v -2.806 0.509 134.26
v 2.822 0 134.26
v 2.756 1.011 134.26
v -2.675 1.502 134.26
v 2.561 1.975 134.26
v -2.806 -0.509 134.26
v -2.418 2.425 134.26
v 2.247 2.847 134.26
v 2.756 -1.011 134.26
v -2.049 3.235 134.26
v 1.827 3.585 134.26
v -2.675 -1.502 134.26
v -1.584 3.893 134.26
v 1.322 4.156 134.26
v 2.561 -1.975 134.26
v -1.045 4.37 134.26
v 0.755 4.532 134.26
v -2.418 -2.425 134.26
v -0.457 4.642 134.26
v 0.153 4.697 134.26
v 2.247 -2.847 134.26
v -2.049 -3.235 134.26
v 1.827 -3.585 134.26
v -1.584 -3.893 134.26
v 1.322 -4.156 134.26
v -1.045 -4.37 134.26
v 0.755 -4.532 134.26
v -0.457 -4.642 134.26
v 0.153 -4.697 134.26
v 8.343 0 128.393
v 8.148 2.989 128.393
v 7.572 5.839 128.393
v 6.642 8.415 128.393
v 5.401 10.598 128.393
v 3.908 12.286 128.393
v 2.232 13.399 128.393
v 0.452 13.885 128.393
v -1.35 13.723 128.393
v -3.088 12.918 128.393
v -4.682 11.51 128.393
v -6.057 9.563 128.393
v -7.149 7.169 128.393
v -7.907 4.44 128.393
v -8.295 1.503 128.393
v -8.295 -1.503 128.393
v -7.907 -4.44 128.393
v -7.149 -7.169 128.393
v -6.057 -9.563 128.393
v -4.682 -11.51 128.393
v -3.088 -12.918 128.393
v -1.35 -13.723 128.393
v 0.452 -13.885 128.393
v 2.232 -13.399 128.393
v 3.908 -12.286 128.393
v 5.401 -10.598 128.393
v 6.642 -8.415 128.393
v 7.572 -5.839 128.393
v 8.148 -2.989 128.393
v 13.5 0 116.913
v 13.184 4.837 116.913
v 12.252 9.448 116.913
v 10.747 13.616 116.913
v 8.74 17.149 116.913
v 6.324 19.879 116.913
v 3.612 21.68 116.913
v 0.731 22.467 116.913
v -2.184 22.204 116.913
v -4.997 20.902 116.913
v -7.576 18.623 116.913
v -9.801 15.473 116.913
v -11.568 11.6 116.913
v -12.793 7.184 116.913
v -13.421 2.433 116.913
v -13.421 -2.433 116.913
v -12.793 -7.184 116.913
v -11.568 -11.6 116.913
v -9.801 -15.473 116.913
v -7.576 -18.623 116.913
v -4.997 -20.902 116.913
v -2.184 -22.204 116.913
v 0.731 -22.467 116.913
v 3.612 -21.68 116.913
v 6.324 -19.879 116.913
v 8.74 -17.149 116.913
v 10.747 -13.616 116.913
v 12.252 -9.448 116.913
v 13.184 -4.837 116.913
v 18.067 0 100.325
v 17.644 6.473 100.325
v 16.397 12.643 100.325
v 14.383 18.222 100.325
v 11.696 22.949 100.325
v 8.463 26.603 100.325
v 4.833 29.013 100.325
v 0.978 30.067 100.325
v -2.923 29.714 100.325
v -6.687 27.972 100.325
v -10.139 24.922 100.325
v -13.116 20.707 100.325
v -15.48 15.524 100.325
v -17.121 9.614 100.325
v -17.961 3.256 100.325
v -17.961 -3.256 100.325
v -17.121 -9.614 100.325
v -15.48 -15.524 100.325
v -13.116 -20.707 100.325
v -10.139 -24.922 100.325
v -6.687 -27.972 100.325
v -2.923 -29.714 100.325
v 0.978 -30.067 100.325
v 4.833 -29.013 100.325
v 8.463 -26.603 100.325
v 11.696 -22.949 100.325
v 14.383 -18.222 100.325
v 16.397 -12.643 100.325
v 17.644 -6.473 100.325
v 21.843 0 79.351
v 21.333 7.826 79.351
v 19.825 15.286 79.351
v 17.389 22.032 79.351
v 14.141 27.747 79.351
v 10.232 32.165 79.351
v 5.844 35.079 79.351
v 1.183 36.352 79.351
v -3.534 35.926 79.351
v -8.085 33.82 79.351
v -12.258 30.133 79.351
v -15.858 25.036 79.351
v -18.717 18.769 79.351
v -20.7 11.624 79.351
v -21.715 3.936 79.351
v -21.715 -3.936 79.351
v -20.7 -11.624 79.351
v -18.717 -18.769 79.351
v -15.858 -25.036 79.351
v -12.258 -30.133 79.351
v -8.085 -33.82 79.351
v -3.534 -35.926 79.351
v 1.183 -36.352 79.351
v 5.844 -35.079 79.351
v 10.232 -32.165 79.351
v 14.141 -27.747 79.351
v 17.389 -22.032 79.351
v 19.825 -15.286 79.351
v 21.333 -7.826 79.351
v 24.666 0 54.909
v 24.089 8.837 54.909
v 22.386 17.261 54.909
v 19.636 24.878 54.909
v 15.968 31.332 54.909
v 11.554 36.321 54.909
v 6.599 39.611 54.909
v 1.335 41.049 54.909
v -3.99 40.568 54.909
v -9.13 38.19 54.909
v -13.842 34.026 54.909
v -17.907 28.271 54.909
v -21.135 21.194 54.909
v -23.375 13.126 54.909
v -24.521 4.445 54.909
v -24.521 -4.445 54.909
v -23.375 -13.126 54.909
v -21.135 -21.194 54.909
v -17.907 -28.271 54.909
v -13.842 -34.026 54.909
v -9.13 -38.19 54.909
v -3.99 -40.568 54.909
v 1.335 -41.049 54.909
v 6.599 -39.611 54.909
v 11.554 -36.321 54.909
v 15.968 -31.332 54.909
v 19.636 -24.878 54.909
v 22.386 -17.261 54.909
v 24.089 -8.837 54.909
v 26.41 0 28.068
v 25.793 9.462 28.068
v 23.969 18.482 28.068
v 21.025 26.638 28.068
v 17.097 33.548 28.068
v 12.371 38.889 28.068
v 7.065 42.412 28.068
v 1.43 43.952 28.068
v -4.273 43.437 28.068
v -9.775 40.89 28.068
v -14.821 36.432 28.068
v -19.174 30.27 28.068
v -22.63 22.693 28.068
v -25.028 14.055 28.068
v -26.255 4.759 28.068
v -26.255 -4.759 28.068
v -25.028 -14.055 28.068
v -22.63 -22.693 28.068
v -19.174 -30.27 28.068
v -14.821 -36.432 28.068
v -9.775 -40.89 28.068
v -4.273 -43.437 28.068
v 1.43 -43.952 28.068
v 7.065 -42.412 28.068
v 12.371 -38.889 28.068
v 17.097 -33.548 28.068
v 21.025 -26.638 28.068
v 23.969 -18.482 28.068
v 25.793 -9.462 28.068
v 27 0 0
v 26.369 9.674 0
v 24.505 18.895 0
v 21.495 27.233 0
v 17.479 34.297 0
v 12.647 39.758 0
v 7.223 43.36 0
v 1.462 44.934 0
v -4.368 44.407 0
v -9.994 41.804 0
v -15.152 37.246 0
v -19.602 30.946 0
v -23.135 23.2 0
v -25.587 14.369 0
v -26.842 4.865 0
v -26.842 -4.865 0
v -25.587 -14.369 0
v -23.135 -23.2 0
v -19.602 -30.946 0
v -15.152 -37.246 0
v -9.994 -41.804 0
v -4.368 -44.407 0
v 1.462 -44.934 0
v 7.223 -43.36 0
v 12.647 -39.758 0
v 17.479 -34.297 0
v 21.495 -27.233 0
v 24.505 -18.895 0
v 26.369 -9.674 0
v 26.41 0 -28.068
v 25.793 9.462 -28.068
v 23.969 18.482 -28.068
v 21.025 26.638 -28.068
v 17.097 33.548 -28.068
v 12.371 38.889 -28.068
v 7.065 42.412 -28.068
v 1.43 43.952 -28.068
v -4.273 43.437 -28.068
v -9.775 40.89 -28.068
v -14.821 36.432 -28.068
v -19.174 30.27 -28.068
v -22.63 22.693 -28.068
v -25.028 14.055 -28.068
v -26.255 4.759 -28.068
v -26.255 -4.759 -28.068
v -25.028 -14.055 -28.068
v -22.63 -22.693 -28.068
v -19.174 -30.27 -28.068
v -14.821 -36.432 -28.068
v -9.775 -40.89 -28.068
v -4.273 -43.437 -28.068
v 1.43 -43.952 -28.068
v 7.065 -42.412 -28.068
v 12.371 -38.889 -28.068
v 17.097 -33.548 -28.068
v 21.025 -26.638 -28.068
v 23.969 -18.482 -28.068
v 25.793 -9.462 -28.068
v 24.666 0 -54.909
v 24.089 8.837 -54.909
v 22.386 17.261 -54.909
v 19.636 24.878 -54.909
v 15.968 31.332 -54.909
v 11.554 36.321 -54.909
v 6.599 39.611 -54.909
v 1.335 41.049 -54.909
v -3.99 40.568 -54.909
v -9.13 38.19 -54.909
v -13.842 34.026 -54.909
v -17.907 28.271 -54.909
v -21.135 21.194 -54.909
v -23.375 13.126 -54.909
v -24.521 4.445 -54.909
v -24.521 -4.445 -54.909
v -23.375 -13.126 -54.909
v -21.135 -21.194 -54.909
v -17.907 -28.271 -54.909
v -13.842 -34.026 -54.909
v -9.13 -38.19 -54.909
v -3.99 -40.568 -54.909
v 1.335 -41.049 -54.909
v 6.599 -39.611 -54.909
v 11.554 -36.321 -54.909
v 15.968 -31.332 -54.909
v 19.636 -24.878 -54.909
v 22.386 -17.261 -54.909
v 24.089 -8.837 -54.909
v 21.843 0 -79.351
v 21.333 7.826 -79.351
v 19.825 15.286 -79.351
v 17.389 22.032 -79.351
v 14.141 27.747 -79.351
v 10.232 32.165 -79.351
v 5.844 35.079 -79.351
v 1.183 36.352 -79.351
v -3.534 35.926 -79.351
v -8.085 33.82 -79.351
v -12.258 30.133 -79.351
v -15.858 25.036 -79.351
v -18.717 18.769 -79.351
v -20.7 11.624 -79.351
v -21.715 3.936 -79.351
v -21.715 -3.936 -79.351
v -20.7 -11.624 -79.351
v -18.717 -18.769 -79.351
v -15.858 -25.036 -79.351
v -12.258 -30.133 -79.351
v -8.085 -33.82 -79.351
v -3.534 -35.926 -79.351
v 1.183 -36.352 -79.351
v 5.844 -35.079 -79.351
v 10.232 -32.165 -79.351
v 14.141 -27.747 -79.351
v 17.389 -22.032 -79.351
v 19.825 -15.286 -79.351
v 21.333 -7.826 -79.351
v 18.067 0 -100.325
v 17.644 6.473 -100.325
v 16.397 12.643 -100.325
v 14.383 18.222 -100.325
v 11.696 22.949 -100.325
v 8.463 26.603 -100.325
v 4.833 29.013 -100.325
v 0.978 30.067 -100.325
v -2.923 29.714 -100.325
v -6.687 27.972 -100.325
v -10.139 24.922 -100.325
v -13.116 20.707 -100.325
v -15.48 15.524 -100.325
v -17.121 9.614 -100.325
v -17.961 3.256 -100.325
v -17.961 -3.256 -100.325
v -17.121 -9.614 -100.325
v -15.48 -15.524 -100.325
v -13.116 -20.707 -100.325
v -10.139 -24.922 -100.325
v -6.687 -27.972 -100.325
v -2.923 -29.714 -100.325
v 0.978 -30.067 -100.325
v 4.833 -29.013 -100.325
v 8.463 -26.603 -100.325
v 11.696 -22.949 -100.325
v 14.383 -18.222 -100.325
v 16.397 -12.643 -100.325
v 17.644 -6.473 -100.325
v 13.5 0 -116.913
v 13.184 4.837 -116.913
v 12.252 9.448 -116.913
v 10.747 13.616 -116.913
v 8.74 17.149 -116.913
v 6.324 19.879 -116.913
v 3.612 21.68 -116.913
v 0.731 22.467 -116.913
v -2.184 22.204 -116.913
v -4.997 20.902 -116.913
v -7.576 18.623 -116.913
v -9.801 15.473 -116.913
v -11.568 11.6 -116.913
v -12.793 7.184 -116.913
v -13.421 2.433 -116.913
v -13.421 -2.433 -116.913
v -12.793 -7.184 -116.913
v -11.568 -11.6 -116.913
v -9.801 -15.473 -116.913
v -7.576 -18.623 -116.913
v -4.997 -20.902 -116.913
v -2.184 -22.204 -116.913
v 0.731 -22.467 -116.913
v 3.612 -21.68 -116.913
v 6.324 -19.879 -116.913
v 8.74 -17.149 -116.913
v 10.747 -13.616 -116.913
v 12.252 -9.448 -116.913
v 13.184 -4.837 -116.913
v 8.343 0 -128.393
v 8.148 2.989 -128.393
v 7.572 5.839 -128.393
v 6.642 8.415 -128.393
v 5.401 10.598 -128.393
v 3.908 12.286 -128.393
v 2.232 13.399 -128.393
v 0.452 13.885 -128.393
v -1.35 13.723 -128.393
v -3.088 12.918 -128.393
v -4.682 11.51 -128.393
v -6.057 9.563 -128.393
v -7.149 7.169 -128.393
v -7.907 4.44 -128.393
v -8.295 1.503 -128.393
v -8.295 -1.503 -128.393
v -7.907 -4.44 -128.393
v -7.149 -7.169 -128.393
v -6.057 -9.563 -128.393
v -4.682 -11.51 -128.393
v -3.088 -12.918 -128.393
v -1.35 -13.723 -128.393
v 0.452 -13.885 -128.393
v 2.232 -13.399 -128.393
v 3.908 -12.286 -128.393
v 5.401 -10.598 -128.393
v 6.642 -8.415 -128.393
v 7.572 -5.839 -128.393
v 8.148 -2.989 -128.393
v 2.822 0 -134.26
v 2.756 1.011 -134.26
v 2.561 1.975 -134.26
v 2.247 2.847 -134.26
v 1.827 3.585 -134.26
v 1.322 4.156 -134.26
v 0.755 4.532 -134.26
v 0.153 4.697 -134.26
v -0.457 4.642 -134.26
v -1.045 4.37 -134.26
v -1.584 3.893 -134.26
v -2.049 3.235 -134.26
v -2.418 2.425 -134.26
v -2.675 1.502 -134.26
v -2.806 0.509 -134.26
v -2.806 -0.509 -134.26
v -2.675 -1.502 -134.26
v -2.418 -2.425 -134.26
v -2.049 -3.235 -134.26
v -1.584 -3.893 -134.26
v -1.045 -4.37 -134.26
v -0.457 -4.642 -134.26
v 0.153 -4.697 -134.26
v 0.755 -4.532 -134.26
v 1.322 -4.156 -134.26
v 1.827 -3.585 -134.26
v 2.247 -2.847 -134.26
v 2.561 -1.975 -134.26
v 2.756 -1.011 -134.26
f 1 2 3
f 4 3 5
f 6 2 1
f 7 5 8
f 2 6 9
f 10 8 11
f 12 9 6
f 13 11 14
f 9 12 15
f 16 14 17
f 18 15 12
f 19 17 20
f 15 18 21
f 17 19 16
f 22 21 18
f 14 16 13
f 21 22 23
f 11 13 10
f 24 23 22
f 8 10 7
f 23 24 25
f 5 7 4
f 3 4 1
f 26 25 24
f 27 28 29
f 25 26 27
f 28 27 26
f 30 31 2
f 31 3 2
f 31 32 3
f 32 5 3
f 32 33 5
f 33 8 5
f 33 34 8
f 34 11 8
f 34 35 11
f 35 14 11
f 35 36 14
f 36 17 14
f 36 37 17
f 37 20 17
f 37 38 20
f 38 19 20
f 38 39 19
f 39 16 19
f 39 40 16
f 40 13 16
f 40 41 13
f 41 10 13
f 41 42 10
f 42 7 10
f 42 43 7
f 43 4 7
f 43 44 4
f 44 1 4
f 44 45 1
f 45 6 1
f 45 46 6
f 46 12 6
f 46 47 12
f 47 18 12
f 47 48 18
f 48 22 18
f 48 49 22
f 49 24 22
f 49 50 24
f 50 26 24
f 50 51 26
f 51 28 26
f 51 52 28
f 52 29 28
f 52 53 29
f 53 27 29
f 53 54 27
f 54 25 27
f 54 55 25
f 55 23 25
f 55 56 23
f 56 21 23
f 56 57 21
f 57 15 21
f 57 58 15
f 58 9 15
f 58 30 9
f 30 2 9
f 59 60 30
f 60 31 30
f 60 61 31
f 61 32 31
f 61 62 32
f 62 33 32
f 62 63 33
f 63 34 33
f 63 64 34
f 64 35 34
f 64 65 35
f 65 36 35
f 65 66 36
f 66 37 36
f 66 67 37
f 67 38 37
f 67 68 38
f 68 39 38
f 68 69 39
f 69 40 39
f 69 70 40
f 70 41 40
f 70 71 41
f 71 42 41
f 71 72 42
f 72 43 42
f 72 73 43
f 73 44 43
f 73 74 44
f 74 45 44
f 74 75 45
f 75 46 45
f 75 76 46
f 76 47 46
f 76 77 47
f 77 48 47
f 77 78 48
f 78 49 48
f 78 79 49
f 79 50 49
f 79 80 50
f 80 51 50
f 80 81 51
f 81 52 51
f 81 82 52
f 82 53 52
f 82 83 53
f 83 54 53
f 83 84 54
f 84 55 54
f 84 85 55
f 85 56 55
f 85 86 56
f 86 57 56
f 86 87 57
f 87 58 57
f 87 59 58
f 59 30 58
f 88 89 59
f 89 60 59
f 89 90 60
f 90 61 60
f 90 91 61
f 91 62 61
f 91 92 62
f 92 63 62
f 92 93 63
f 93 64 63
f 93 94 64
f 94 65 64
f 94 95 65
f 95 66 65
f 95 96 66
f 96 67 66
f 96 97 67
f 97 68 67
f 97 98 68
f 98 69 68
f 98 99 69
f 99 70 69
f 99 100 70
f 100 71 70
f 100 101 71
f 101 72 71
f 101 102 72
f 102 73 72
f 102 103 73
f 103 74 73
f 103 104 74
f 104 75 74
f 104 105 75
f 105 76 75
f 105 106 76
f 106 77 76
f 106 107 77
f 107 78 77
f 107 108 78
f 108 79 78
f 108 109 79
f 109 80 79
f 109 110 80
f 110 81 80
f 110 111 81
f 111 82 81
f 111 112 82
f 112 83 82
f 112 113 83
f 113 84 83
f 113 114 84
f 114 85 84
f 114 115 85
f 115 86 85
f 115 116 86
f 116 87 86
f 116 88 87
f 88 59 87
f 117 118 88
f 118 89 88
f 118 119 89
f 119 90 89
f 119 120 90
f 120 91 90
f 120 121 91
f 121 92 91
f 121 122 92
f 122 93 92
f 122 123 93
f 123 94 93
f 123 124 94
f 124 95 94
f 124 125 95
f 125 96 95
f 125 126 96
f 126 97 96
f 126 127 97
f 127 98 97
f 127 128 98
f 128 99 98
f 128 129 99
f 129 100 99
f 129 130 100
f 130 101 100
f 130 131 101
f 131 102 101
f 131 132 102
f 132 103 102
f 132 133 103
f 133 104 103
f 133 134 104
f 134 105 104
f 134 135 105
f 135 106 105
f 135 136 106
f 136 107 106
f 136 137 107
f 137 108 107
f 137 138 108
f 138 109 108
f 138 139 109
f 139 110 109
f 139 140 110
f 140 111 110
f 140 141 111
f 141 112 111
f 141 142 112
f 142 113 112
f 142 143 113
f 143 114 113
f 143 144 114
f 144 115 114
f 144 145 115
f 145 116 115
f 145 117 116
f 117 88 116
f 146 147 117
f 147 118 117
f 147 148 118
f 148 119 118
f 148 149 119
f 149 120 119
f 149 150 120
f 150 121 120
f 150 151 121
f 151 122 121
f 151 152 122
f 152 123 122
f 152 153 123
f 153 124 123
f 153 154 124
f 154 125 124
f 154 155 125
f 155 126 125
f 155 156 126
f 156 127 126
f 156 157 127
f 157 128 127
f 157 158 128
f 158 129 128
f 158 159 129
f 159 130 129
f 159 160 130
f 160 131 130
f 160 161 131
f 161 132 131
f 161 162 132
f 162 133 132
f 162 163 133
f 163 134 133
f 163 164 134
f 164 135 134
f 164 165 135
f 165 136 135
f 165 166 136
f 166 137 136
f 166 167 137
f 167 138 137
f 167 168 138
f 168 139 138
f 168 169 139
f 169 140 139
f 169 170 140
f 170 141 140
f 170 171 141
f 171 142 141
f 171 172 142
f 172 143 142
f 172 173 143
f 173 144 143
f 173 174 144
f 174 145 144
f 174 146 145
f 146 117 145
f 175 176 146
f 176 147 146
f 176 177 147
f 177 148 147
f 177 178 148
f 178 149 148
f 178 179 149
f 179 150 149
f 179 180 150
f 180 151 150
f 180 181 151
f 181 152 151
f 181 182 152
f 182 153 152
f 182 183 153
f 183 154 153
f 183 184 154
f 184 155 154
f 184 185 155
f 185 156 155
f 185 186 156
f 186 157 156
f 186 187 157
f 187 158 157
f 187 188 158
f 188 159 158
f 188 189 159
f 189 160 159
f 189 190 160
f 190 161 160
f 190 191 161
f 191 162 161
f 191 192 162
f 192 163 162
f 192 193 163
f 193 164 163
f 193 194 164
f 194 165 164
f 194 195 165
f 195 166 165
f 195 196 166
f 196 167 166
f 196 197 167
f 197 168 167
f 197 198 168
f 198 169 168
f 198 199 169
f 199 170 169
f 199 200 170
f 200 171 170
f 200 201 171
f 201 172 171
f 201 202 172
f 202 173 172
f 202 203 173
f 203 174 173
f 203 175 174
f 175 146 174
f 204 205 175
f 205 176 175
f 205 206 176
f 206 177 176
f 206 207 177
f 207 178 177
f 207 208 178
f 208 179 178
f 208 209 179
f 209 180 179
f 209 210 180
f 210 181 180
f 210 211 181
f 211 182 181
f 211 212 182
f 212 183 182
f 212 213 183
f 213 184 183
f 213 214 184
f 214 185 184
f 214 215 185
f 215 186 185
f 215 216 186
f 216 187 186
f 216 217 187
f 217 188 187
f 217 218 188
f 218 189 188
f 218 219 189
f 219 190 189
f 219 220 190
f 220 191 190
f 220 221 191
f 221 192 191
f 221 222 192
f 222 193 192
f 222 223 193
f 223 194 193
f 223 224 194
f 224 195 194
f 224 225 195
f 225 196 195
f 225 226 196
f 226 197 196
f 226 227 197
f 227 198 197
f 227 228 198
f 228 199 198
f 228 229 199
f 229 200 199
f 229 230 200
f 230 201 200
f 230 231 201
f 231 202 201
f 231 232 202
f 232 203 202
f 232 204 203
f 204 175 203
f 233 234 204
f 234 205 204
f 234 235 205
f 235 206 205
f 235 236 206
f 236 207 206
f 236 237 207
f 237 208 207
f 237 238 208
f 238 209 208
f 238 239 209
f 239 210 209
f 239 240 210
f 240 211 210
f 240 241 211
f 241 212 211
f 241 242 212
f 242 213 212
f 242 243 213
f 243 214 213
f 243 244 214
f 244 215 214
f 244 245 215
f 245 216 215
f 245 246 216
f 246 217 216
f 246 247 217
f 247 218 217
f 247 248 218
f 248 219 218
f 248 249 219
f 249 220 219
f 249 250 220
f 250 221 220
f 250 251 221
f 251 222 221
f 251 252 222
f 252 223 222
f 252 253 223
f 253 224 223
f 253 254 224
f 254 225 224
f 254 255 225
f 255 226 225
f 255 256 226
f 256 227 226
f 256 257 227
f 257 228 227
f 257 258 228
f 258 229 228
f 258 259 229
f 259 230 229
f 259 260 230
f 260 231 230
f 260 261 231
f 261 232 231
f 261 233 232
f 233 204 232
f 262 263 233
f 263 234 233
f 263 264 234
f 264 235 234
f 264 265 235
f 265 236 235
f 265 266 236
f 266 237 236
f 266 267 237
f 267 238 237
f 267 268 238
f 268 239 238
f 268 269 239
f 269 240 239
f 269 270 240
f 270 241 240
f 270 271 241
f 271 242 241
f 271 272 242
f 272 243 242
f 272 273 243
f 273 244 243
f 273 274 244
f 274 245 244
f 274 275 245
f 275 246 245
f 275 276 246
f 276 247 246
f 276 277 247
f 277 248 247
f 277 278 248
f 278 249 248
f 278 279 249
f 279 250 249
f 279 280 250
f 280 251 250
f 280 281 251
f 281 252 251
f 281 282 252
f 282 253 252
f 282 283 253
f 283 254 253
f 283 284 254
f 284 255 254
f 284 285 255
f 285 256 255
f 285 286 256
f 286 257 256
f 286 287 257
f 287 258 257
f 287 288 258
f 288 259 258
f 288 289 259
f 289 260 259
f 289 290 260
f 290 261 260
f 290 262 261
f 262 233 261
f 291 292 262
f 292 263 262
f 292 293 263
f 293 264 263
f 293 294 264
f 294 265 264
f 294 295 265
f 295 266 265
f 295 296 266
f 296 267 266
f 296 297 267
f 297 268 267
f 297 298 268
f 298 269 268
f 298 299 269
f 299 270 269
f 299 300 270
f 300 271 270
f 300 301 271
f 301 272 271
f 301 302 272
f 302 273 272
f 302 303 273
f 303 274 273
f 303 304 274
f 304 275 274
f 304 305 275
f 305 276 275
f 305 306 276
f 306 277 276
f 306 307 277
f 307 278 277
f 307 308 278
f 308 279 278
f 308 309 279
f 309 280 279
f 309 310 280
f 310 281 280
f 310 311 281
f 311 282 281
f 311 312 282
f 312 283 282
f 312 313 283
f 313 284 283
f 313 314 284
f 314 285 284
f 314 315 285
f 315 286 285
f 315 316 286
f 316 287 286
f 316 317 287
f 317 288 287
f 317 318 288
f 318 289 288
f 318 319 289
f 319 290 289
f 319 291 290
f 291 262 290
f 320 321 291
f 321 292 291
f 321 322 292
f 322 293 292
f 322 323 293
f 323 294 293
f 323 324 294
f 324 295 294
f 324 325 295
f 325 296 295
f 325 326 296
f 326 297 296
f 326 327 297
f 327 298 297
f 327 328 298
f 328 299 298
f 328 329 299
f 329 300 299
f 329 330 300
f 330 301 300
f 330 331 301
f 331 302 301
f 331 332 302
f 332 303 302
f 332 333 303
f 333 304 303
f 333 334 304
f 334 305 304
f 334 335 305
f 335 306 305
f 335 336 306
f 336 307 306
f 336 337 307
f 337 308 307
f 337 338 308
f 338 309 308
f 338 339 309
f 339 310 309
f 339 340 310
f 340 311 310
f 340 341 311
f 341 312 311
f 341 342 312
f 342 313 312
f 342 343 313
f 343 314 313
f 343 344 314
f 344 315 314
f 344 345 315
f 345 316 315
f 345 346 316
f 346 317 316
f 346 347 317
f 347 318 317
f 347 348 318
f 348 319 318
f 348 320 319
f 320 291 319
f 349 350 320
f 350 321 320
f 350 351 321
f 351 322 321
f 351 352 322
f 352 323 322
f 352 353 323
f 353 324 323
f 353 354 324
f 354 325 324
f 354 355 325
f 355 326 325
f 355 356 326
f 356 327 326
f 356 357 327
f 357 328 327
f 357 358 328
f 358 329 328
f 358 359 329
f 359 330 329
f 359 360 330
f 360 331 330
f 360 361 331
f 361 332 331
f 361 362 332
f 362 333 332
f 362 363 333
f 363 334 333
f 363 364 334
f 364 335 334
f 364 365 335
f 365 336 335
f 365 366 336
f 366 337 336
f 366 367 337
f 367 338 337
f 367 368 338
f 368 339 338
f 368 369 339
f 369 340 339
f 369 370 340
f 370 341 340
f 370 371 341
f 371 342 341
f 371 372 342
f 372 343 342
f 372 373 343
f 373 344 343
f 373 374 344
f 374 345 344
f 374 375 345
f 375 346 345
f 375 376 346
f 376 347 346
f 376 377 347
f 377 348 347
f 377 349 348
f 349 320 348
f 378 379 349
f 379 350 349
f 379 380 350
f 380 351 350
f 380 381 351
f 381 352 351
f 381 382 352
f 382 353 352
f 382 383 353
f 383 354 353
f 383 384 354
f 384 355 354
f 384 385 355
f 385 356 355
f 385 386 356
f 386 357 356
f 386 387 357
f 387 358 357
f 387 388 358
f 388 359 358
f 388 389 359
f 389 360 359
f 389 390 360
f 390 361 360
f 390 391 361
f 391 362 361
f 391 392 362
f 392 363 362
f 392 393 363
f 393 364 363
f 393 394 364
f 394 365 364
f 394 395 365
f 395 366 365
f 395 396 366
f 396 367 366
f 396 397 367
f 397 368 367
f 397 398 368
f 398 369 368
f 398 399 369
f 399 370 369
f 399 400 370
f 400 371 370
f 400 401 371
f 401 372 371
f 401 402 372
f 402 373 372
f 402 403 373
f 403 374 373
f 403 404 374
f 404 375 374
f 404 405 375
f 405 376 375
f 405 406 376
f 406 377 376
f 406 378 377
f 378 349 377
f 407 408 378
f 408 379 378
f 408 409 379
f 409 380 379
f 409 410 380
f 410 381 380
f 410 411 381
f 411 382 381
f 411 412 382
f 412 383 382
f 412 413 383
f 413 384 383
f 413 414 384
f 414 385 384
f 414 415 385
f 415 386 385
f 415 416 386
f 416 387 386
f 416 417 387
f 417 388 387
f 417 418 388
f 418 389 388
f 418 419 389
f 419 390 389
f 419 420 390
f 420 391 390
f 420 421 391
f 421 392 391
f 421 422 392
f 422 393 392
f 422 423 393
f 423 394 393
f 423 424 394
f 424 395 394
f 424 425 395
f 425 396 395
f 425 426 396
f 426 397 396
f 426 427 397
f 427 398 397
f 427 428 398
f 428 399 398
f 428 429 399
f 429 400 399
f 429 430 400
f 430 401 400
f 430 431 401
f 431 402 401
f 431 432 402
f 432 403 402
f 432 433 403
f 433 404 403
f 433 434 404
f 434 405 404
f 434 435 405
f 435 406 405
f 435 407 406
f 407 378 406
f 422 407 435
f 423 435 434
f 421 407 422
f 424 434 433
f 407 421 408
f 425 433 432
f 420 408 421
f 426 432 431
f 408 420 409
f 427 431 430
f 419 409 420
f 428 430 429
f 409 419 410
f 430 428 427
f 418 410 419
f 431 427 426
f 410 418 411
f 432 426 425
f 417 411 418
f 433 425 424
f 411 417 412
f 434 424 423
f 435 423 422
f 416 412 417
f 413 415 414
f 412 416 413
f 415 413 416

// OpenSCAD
// Generated by SolidPython 1.0.1 on 2020-07-29 00:46:45


scale(v = [3, 5, 15]) {
	sphere(r = 9);
}
/***********************************************
*********      SolidPython code:      **********
************************************************
 
# import packages: SolidPython
from solid import *
from solid.utils import *
from itertools import chain, combinations, permutations


class Resize:

    def __init__(self, scad_file):
        self.scad_file = scad_file
        #self.scad_file = import_scad(scad_file)
        # cone/cylinder param:
        self.r1 = 0
        self.r2 = 0
        self.h = 0
        # rectangular prism param:
        self.w = 0
        self.l = 0
        # ellipse param:
        self.r = 0

    # import OpenScad code (file name corresponds to shape)


    # classify shape + parameters
    def assign(self, param1, param2, param3):
        if self.scad_file == 'cone.scad':
            self.r1 = param1
            self.r2 = param2
            self.h = param3
        elif self.scad_file == 'cylinder.scad':
            self.r1 = param1
            self.r2 = param2
            self.h = param3
        elif self.scad_file == 'rectangularPrism.scad':
            self.h = param1
            self.l = param2
            self.w = param3
        else:
            self.r = param1
            self.h = param2

    # resize parameters
    def iterate(self):
        x = range(3, 20, 2)
        i = 1
        if self.scad_file == 'cone.scad':
            tempList = list(permutations(x, 2))
            for temp in tempList:
                param1 = temp[0]
                param2 = temp[1]
                filepath = 'produced_scad_files/' + 'cone' + str(param1) + '_' + str(param2) + '_' + '.scad'
                scad_render_to_file(cylinder(h=param1, r1=param2, r2=0), filepath)

        elif self.scad_file == 'cylinder.scad':
            tempList = list(permutations(x, 3))
            for temp in tempList:
                param1 = temp[0]
                param2 = temp[1]
                filepath = 'produced_scad_files/' + 'cylinder' + str(param1) + '_' + str(param2) + '_' + '.scad'
                scad_render_to_file(cylinder(h=param1, r1=param2, r2=param2), filepath)

        elif self.scad_file == 'rectangularPrism.scad':
            tempList = list(permutations(x, 3))
            for temp in tempList:
                param1 = temp[0]
                param2 = temp[1]
                param3 = temp[2]
                filepath = 'produced_scad_files/' + 'rectangularPrism' + str(param1) + '_' + str(param2) + '_' + str(
                    param3) + '.scad'
                scad_render_to_file(cube(size=(param1, param2, param3)), filepath)

        elif self.scad_file == 'ellipse.scad':
            tempList = list(permutations(x, 4))
            for temp in tempList:
                param1 = temp[0]
                param2 = temp[1]
                param3 = temp[2]
                param4 = temp[3]
                filepath = 'produced_scad_files/' + 'ellipse' + str(param1) + '_' + str(param2) + '_' + str(param3) + '_' + str(param4) + '.scad'
                scad_render_to_file(scale([param1, param2, param3])(sphere(r=param4)), filepath)

    def render_to_scadfile(self):
        scad_render_to_file(scad, 'example.scad') 
 
************************************************/
